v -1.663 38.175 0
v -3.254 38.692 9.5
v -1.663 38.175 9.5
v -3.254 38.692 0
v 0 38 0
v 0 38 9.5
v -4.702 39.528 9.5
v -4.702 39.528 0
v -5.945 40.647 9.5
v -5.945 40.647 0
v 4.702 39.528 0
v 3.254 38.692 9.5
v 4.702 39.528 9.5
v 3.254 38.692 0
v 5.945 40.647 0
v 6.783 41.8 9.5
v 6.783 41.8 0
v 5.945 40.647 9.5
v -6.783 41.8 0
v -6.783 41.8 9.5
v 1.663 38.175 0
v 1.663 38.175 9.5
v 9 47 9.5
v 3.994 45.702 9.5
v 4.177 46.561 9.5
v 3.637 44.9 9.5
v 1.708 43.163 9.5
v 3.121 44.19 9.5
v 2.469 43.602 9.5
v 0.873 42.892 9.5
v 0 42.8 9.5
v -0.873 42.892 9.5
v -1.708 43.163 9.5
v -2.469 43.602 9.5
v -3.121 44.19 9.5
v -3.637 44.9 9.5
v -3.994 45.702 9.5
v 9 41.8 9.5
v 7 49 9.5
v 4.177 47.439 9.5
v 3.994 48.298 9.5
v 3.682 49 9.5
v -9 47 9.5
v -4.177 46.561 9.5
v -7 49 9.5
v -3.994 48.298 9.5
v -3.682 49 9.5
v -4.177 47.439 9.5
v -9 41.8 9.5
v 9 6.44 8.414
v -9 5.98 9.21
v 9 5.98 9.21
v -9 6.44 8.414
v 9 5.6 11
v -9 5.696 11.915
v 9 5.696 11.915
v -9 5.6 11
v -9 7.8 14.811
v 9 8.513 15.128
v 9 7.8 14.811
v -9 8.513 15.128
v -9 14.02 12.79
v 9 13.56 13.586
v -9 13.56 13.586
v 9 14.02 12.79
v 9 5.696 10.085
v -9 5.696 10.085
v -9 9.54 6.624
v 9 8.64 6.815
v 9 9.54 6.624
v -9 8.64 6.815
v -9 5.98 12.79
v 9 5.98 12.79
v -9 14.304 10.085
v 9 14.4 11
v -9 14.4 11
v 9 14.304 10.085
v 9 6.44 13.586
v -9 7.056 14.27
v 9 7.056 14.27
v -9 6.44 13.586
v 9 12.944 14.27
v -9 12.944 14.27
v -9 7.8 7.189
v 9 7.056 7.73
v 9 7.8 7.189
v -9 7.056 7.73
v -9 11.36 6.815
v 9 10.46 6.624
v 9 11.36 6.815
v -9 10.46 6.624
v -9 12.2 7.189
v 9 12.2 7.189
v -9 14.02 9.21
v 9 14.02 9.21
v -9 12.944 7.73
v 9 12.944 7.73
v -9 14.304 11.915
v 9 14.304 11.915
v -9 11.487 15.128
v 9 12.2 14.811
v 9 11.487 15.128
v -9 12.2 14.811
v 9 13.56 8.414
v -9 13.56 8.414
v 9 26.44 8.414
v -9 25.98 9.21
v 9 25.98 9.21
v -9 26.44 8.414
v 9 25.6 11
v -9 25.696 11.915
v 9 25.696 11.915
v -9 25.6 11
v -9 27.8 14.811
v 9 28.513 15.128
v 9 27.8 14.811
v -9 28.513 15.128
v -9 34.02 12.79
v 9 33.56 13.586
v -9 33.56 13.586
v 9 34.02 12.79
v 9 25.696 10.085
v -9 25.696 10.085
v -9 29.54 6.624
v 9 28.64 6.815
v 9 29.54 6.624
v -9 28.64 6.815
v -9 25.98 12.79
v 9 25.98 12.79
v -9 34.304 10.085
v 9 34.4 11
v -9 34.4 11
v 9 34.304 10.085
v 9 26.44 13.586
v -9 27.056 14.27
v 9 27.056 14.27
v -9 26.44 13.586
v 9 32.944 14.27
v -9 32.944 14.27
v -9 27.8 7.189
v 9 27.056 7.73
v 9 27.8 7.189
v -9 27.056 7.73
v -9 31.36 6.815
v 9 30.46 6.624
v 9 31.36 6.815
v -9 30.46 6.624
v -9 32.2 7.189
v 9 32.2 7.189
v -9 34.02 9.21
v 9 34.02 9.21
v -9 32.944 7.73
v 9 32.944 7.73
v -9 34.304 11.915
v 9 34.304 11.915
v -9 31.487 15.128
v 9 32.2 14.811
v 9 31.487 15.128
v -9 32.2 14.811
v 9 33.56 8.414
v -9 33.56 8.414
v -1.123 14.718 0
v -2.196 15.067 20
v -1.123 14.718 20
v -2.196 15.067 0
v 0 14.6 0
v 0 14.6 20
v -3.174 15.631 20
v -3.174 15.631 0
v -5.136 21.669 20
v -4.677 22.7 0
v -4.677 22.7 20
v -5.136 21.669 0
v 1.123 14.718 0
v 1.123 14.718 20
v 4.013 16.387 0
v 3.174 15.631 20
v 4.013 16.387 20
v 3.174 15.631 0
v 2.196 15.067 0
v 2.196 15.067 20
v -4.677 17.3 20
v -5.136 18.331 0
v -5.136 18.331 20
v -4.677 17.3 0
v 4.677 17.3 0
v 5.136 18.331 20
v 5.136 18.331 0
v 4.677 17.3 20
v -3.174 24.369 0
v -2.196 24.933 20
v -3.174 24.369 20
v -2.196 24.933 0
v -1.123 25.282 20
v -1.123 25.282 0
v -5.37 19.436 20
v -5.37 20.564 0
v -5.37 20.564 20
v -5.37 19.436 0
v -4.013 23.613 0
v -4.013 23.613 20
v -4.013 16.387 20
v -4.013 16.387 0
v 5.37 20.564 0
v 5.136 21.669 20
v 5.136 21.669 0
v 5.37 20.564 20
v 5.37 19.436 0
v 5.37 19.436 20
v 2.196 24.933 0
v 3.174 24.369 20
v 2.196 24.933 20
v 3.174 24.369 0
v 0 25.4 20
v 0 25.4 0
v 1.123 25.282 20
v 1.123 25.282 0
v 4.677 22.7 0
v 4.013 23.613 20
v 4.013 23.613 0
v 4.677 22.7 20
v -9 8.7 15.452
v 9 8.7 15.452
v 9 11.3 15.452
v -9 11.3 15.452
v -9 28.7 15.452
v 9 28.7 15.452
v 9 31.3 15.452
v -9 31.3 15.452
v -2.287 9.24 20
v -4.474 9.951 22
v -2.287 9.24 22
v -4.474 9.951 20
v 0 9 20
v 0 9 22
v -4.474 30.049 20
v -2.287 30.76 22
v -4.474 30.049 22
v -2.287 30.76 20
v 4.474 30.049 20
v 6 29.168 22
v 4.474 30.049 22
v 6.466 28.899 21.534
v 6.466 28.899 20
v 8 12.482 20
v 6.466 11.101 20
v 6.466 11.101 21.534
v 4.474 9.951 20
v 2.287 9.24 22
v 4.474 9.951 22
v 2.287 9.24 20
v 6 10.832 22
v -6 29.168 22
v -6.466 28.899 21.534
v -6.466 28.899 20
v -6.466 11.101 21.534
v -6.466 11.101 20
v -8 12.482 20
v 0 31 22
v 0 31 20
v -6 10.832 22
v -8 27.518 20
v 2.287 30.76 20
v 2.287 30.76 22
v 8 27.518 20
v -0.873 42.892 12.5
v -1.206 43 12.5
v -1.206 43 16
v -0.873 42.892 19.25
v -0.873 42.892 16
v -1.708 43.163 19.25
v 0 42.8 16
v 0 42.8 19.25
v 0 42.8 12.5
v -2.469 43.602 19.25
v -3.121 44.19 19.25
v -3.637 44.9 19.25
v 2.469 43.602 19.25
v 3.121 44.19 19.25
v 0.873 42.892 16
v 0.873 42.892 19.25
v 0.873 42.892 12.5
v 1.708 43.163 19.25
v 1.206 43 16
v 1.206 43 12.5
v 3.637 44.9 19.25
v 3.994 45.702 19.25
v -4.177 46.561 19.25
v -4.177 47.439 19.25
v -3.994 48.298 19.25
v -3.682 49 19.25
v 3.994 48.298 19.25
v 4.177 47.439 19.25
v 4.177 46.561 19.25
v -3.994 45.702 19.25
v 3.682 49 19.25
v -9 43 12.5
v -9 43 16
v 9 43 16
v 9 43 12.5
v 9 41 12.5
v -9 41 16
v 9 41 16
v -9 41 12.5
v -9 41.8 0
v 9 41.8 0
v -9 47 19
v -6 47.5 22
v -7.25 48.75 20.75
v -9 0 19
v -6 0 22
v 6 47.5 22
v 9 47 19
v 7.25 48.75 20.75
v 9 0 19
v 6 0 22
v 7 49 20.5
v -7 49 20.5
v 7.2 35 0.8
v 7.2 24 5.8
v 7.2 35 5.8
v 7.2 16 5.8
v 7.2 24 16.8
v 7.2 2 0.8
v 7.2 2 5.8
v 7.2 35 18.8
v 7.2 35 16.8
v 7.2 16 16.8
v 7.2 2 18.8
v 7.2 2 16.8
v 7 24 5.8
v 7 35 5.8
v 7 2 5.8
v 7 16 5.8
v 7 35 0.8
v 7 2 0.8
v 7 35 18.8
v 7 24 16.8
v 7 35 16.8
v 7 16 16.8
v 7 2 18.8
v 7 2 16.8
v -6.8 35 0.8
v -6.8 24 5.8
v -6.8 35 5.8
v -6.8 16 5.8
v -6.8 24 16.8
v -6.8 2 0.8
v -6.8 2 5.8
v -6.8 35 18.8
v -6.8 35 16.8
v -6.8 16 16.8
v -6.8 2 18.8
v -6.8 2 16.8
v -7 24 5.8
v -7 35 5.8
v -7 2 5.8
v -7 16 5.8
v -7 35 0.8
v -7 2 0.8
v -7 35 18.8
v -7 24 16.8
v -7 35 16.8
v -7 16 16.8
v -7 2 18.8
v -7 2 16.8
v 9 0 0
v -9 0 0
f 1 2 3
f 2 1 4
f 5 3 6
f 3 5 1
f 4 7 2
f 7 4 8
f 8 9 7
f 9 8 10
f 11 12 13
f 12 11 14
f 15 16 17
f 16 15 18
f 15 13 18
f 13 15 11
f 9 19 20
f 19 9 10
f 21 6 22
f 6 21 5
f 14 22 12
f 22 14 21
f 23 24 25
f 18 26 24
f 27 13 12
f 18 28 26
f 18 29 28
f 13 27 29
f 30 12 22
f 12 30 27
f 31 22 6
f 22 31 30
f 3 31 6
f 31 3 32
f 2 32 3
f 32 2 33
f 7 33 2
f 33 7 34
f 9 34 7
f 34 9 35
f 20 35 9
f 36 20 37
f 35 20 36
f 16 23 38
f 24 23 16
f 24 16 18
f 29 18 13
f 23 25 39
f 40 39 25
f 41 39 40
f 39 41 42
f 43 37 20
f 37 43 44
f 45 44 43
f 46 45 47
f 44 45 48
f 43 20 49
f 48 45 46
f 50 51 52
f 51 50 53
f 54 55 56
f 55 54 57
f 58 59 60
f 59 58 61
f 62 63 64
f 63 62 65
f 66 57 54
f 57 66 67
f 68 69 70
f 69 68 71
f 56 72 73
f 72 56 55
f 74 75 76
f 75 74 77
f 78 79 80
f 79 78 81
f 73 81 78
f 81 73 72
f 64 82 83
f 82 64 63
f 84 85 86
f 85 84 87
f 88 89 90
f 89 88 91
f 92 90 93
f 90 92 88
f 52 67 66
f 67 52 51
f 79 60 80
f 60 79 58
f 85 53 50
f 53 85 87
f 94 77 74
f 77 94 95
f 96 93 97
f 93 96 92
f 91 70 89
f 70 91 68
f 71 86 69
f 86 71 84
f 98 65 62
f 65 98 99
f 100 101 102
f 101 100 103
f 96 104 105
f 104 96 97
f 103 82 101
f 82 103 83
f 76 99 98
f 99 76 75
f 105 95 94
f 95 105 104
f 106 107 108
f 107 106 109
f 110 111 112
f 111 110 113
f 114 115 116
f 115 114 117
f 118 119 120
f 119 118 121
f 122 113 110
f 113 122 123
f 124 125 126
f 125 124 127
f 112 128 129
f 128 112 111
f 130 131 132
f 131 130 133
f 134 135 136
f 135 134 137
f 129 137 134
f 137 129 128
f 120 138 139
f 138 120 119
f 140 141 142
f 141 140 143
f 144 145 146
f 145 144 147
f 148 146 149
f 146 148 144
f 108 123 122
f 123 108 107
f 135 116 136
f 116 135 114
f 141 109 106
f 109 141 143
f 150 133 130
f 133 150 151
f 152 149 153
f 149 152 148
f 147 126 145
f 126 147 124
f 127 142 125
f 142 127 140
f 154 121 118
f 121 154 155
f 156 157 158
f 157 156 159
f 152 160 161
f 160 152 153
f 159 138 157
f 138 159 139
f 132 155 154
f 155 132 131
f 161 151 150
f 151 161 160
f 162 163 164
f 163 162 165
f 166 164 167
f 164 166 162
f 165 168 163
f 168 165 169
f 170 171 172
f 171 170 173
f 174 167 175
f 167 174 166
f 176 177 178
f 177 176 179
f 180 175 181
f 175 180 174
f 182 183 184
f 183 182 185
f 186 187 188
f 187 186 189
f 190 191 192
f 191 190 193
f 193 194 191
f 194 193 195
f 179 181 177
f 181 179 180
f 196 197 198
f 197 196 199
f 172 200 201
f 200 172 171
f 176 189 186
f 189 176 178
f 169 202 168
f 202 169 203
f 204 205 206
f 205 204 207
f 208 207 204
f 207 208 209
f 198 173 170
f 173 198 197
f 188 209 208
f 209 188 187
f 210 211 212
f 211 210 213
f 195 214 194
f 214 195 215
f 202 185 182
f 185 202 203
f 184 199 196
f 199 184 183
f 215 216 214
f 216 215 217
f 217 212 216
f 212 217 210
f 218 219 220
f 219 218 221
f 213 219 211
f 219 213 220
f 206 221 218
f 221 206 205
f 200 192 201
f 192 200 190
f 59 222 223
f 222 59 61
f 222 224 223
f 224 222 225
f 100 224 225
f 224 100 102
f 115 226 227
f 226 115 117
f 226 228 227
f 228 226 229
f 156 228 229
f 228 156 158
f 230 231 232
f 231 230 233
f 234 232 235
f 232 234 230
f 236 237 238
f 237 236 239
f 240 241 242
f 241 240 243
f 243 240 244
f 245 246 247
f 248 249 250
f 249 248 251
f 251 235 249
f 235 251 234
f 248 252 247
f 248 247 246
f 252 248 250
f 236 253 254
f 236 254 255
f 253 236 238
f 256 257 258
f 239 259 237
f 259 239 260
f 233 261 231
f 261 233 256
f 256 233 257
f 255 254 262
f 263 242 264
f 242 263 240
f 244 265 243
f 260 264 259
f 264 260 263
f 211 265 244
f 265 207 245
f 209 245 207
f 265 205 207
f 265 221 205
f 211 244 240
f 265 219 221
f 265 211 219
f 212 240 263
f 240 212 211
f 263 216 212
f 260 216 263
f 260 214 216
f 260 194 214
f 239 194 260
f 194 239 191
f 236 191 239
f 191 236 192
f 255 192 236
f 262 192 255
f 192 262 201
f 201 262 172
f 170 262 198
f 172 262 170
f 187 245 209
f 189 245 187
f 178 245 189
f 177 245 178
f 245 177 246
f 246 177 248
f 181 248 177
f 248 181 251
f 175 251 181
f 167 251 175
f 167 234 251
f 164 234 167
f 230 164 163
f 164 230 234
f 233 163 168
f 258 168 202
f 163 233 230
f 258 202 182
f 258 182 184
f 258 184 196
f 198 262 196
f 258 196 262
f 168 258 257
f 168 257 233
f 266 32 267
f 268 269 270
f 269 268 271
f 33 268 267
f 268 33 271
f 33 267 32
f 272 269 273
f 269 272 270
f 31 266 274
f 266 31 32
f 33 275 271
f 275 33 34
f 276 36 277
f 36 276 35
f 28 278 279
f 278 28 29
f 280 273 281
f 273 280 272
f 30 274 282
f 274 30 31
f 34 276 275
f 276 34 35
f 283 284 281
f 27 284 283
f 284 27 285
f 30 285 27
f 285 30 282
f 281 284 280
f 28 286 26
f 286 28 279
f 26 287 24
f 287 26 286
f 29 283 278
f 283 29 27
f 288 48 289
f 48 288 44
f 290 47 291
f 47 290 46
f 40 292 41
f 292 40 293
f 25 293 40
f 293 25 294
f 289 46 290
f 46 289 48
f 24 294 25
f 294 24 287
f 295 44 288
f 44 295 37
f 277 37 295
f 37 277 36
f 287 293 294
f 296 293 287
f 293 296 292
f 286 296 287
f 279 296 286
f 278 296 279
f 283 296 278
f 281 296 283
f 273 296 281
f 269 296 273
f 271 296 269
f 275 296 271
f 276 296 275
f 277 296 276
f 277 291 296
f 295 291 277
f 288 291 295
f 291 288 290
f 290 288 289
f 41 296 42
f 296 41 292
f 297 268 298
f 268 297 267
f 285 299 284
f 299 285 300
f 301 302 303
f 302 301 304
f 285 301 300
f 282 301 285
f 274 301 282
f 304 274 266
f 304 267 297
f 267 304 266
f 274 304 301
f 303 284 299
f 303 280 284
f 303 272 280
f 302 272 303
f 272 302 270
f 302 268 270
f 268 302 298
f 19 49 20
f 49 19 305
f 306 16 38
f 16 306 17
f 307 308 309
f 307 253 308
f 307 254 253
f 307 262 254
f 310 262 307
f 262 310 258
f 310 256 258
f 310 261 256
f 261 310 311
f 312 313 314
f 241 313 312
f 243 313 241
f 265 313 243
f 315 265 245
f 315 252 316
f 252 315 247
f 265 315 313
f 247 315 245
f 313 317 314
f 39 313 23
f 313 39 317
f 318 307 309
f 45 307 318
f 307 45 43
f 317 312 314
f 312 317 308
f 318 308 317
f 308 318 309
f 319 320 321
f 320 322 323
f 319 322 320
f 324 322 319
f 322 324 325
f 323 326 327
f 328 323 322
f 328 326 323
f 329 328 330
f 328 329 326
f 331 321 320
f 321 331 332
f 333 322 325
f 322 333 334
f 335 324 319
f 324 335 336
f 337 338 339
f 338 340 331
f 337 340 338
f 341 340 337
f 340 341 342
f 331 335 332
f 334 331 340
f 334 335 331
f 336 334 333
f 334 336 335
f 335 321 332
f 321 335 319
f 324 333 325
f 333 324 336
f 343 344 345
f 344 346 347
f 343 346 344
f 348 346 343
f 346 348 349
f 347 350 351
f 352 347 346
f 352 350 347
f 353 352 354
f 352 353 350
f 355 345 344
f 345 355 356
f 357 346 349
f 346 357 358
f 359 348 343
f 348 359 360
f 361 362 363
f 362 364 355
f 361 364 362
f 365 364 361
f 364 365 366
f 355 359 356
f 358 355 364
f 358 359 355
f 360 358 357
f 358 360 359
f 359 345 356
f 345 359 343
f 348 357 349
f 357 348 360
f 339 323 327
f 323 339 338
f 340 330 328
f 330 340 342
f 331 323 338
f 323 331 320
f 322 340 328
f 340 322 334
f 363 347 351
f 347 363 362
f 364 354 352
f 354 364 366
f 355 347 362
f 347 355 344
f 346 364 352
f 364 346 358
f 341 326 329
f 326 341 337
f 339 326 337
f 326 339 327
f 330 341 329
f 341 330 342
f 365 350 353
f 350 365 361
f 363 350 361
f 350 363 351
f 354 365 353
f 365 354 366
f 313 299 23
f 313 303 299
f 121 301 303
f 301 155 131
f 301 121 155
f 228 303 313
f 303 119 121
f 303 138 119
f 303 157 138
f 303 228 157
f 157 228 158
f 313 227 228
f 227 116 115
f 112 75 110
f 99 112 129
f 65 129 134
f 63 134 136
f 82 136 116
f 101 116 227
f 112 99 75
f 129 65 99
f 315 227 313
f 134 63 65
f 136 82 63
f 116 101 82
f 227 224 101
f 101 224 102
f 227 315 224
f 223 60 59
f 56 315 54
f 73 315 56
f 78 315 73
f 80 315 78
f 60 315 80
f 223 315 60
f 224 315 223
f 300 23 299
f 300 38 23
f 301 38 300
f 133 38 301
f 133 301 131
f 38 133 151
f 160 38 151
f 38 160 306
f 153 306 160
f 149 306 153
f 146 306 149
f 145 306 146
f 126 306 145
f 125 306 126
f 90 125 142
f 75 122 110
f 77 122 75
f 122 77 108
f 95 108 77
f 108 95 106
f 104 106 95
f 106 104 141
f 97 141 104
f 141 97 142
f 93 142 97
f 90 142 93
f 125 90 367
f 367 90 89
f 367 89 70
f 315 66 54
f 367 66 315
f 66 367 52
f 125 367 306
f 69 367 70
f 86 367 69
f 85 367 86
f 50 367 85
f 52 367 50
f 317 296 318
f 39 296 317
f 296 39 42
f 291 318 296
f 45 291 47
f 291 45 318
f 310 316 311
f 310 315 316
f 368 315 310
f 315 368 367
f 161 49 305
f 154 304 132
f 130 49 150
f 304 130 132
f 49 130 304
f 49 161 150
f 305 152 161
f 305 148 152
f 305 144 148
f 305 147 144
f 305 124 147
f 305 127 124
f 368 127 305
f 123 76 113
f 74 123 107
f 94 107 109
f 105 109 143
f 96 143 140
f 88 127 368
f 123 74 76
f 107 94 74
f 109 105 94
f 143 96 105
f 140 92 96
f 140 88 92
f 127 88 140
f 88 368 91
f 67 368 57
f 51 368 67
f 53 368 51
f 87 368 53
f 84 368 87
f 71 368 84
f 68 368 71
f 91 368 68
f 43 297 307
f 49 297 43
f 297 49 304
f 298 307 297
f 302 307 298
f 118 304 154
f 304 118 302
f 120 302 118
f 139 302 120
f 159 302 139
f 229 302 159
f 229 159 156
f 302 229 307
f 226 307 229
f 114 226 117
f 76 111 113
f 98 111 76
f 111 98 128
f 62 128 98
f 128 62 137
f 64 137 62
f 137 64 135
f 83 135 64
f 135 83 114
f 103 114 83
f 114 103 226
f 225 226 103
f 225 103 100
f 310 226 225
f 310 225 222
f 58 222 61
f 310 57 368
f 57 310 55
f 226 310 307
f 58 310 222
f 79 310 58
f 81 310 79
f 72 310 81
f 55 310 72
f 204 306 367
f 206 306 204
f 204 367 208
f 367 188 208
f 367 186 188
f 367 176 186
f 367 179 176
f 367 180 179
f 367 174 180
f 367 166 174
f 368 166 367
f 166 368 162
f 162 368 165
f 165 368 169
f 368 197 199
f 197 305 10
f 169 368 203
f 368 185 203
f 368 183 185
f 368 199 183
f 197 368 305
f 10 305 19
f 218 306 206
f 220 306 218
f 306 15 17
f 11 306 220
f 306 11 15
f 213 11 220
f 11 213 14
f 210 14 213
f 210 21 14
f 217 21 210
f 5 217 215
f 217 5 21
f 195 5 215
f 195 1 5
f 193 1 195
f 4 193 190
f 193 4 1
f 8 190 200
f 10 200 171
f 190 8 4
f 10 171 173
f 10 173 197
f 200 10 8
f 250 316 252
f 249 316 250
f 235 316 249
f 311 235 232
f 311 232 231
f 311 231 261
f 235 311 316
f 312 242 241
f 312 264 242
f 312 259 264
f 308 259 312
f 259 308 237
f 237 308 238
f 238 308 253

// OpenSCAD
// PRUSA iteration3
// Y frame corners
// GNU GPL v3
// Josef Průša <iam@josefprusa.cz> and contributors
// http://www.reprap.org/wiki/Prusa_Mendel
// http://prusamendel.org


module corner_base(){	
 translate([-9,-11,0])cube([18,22,49]);
 
}

module corner_holes(){
 translate([-11,-11,0]){
  // Bottom hole
  translate([0,11,10]) rotate([0,90,0]) translate([0,0,-5]) cylinder(h = 270, r=4.4, $fn=30);
  // Top hole
  translate([0,11,30]) rotate([0,90,0]) translate([0,0,-5]) cylinder(h = 270, r=4.4, $fn=30);
  // Middle hole
  translate([11,0,20]) rotate([0,0,90]) rotate([0,90,0]) translate([0,0,-5]) cylinder(h = 270, r=5.4, $fn=30);
  // Bottom hole bridge
  translate([0,8.8,10]) rotate([0,90,0]) translate([0,0,-5]) cylinder(h = 270, r=2.6, $fn=6);
  // Top hole bridge
  translate([0,8.8,30]) rotate([0,90,0]) translate([0,0,-5]) cylinder(h = 270, r=2.6, $fn=6);

  // Washer hole
  translate([11,-3,20]) rotate([0,0,90]) rotate([0,90,0]) translate([0,0,-5]) cylinder(h = 10, r=11, $fn=30);

  // Top smooth rod insert
  // Smooth rod place
  translate([11,2.75,47]) rotate([0,90,90]) cylinder(h = 10, r=4.2, $fn=30); 
  // Ziptie
  translate([-5,6,41])  cube([30,3.5,2]);
  
  // LM8UU keepout
  difference(){
    translate([11,12.5,46]) rotate([0,90,90]) cylinder(h = 270, r=8, $fn=30);
    translate([21,12.5,62]) rotate([0,90,90]) cube([20,20,30]);
  } 
  
  translate([21,12.5,57]) rotate([0,90,90]) cube([15.2,20,20]);
 
 }
 
}

module corner_fancy(){
 // Side corner cutouts
  translate([-8,-9,0]) rotate([0,0,-45-180]) translate([-15,0,-1]) cube([30,30,51]);
  translate([8,-9,0]) rotate([0,0,45-180]) translate([-15,0,-1]) cube([30,30,51]);
 // Top corner cutouts
    translate([7,0,49]) rotate([0,45,0]) translate([-15,-15,0]) cube([30,30,30]);
    translate([-7,0,49]) rotate([0,-45,0]) translate([-15,-15,0]) cube([30,30,30]);
    rotate([0,0,90]){
    translate([-9.5,0,49]) rotate([0,-45,0]) translate([-15,-15,0]) cube([30,30,30]);
    }
}

module selective_infill(){
    
    translate([7,2,0.8])cube([0.2,33,5]); 
    translate([-7,2,0.8])cube([0.2,33,5]);
    
    translate([ 7,16,5.8])cube([0.2,8,11]);
    translate([-7,16,5.8])cube([0.2,8,11]);
    
    translate([7,2,16.8])cube([0.2,33,2]); 
    translate([-7,2,16.8])cube([0.2,33,2]);
}
    
    
// Final part
module corner(){
 // Rotate the part for better printing
    translate([0,0,11]) rotate([-90,0,0]) 
    {
    difference(){
        corner_base();
        corner_holes();
        corner_fancy();
        translate([0,11,0]) rotate([90,0,0])selective_infill();
        
    }
    }

}

corner();
